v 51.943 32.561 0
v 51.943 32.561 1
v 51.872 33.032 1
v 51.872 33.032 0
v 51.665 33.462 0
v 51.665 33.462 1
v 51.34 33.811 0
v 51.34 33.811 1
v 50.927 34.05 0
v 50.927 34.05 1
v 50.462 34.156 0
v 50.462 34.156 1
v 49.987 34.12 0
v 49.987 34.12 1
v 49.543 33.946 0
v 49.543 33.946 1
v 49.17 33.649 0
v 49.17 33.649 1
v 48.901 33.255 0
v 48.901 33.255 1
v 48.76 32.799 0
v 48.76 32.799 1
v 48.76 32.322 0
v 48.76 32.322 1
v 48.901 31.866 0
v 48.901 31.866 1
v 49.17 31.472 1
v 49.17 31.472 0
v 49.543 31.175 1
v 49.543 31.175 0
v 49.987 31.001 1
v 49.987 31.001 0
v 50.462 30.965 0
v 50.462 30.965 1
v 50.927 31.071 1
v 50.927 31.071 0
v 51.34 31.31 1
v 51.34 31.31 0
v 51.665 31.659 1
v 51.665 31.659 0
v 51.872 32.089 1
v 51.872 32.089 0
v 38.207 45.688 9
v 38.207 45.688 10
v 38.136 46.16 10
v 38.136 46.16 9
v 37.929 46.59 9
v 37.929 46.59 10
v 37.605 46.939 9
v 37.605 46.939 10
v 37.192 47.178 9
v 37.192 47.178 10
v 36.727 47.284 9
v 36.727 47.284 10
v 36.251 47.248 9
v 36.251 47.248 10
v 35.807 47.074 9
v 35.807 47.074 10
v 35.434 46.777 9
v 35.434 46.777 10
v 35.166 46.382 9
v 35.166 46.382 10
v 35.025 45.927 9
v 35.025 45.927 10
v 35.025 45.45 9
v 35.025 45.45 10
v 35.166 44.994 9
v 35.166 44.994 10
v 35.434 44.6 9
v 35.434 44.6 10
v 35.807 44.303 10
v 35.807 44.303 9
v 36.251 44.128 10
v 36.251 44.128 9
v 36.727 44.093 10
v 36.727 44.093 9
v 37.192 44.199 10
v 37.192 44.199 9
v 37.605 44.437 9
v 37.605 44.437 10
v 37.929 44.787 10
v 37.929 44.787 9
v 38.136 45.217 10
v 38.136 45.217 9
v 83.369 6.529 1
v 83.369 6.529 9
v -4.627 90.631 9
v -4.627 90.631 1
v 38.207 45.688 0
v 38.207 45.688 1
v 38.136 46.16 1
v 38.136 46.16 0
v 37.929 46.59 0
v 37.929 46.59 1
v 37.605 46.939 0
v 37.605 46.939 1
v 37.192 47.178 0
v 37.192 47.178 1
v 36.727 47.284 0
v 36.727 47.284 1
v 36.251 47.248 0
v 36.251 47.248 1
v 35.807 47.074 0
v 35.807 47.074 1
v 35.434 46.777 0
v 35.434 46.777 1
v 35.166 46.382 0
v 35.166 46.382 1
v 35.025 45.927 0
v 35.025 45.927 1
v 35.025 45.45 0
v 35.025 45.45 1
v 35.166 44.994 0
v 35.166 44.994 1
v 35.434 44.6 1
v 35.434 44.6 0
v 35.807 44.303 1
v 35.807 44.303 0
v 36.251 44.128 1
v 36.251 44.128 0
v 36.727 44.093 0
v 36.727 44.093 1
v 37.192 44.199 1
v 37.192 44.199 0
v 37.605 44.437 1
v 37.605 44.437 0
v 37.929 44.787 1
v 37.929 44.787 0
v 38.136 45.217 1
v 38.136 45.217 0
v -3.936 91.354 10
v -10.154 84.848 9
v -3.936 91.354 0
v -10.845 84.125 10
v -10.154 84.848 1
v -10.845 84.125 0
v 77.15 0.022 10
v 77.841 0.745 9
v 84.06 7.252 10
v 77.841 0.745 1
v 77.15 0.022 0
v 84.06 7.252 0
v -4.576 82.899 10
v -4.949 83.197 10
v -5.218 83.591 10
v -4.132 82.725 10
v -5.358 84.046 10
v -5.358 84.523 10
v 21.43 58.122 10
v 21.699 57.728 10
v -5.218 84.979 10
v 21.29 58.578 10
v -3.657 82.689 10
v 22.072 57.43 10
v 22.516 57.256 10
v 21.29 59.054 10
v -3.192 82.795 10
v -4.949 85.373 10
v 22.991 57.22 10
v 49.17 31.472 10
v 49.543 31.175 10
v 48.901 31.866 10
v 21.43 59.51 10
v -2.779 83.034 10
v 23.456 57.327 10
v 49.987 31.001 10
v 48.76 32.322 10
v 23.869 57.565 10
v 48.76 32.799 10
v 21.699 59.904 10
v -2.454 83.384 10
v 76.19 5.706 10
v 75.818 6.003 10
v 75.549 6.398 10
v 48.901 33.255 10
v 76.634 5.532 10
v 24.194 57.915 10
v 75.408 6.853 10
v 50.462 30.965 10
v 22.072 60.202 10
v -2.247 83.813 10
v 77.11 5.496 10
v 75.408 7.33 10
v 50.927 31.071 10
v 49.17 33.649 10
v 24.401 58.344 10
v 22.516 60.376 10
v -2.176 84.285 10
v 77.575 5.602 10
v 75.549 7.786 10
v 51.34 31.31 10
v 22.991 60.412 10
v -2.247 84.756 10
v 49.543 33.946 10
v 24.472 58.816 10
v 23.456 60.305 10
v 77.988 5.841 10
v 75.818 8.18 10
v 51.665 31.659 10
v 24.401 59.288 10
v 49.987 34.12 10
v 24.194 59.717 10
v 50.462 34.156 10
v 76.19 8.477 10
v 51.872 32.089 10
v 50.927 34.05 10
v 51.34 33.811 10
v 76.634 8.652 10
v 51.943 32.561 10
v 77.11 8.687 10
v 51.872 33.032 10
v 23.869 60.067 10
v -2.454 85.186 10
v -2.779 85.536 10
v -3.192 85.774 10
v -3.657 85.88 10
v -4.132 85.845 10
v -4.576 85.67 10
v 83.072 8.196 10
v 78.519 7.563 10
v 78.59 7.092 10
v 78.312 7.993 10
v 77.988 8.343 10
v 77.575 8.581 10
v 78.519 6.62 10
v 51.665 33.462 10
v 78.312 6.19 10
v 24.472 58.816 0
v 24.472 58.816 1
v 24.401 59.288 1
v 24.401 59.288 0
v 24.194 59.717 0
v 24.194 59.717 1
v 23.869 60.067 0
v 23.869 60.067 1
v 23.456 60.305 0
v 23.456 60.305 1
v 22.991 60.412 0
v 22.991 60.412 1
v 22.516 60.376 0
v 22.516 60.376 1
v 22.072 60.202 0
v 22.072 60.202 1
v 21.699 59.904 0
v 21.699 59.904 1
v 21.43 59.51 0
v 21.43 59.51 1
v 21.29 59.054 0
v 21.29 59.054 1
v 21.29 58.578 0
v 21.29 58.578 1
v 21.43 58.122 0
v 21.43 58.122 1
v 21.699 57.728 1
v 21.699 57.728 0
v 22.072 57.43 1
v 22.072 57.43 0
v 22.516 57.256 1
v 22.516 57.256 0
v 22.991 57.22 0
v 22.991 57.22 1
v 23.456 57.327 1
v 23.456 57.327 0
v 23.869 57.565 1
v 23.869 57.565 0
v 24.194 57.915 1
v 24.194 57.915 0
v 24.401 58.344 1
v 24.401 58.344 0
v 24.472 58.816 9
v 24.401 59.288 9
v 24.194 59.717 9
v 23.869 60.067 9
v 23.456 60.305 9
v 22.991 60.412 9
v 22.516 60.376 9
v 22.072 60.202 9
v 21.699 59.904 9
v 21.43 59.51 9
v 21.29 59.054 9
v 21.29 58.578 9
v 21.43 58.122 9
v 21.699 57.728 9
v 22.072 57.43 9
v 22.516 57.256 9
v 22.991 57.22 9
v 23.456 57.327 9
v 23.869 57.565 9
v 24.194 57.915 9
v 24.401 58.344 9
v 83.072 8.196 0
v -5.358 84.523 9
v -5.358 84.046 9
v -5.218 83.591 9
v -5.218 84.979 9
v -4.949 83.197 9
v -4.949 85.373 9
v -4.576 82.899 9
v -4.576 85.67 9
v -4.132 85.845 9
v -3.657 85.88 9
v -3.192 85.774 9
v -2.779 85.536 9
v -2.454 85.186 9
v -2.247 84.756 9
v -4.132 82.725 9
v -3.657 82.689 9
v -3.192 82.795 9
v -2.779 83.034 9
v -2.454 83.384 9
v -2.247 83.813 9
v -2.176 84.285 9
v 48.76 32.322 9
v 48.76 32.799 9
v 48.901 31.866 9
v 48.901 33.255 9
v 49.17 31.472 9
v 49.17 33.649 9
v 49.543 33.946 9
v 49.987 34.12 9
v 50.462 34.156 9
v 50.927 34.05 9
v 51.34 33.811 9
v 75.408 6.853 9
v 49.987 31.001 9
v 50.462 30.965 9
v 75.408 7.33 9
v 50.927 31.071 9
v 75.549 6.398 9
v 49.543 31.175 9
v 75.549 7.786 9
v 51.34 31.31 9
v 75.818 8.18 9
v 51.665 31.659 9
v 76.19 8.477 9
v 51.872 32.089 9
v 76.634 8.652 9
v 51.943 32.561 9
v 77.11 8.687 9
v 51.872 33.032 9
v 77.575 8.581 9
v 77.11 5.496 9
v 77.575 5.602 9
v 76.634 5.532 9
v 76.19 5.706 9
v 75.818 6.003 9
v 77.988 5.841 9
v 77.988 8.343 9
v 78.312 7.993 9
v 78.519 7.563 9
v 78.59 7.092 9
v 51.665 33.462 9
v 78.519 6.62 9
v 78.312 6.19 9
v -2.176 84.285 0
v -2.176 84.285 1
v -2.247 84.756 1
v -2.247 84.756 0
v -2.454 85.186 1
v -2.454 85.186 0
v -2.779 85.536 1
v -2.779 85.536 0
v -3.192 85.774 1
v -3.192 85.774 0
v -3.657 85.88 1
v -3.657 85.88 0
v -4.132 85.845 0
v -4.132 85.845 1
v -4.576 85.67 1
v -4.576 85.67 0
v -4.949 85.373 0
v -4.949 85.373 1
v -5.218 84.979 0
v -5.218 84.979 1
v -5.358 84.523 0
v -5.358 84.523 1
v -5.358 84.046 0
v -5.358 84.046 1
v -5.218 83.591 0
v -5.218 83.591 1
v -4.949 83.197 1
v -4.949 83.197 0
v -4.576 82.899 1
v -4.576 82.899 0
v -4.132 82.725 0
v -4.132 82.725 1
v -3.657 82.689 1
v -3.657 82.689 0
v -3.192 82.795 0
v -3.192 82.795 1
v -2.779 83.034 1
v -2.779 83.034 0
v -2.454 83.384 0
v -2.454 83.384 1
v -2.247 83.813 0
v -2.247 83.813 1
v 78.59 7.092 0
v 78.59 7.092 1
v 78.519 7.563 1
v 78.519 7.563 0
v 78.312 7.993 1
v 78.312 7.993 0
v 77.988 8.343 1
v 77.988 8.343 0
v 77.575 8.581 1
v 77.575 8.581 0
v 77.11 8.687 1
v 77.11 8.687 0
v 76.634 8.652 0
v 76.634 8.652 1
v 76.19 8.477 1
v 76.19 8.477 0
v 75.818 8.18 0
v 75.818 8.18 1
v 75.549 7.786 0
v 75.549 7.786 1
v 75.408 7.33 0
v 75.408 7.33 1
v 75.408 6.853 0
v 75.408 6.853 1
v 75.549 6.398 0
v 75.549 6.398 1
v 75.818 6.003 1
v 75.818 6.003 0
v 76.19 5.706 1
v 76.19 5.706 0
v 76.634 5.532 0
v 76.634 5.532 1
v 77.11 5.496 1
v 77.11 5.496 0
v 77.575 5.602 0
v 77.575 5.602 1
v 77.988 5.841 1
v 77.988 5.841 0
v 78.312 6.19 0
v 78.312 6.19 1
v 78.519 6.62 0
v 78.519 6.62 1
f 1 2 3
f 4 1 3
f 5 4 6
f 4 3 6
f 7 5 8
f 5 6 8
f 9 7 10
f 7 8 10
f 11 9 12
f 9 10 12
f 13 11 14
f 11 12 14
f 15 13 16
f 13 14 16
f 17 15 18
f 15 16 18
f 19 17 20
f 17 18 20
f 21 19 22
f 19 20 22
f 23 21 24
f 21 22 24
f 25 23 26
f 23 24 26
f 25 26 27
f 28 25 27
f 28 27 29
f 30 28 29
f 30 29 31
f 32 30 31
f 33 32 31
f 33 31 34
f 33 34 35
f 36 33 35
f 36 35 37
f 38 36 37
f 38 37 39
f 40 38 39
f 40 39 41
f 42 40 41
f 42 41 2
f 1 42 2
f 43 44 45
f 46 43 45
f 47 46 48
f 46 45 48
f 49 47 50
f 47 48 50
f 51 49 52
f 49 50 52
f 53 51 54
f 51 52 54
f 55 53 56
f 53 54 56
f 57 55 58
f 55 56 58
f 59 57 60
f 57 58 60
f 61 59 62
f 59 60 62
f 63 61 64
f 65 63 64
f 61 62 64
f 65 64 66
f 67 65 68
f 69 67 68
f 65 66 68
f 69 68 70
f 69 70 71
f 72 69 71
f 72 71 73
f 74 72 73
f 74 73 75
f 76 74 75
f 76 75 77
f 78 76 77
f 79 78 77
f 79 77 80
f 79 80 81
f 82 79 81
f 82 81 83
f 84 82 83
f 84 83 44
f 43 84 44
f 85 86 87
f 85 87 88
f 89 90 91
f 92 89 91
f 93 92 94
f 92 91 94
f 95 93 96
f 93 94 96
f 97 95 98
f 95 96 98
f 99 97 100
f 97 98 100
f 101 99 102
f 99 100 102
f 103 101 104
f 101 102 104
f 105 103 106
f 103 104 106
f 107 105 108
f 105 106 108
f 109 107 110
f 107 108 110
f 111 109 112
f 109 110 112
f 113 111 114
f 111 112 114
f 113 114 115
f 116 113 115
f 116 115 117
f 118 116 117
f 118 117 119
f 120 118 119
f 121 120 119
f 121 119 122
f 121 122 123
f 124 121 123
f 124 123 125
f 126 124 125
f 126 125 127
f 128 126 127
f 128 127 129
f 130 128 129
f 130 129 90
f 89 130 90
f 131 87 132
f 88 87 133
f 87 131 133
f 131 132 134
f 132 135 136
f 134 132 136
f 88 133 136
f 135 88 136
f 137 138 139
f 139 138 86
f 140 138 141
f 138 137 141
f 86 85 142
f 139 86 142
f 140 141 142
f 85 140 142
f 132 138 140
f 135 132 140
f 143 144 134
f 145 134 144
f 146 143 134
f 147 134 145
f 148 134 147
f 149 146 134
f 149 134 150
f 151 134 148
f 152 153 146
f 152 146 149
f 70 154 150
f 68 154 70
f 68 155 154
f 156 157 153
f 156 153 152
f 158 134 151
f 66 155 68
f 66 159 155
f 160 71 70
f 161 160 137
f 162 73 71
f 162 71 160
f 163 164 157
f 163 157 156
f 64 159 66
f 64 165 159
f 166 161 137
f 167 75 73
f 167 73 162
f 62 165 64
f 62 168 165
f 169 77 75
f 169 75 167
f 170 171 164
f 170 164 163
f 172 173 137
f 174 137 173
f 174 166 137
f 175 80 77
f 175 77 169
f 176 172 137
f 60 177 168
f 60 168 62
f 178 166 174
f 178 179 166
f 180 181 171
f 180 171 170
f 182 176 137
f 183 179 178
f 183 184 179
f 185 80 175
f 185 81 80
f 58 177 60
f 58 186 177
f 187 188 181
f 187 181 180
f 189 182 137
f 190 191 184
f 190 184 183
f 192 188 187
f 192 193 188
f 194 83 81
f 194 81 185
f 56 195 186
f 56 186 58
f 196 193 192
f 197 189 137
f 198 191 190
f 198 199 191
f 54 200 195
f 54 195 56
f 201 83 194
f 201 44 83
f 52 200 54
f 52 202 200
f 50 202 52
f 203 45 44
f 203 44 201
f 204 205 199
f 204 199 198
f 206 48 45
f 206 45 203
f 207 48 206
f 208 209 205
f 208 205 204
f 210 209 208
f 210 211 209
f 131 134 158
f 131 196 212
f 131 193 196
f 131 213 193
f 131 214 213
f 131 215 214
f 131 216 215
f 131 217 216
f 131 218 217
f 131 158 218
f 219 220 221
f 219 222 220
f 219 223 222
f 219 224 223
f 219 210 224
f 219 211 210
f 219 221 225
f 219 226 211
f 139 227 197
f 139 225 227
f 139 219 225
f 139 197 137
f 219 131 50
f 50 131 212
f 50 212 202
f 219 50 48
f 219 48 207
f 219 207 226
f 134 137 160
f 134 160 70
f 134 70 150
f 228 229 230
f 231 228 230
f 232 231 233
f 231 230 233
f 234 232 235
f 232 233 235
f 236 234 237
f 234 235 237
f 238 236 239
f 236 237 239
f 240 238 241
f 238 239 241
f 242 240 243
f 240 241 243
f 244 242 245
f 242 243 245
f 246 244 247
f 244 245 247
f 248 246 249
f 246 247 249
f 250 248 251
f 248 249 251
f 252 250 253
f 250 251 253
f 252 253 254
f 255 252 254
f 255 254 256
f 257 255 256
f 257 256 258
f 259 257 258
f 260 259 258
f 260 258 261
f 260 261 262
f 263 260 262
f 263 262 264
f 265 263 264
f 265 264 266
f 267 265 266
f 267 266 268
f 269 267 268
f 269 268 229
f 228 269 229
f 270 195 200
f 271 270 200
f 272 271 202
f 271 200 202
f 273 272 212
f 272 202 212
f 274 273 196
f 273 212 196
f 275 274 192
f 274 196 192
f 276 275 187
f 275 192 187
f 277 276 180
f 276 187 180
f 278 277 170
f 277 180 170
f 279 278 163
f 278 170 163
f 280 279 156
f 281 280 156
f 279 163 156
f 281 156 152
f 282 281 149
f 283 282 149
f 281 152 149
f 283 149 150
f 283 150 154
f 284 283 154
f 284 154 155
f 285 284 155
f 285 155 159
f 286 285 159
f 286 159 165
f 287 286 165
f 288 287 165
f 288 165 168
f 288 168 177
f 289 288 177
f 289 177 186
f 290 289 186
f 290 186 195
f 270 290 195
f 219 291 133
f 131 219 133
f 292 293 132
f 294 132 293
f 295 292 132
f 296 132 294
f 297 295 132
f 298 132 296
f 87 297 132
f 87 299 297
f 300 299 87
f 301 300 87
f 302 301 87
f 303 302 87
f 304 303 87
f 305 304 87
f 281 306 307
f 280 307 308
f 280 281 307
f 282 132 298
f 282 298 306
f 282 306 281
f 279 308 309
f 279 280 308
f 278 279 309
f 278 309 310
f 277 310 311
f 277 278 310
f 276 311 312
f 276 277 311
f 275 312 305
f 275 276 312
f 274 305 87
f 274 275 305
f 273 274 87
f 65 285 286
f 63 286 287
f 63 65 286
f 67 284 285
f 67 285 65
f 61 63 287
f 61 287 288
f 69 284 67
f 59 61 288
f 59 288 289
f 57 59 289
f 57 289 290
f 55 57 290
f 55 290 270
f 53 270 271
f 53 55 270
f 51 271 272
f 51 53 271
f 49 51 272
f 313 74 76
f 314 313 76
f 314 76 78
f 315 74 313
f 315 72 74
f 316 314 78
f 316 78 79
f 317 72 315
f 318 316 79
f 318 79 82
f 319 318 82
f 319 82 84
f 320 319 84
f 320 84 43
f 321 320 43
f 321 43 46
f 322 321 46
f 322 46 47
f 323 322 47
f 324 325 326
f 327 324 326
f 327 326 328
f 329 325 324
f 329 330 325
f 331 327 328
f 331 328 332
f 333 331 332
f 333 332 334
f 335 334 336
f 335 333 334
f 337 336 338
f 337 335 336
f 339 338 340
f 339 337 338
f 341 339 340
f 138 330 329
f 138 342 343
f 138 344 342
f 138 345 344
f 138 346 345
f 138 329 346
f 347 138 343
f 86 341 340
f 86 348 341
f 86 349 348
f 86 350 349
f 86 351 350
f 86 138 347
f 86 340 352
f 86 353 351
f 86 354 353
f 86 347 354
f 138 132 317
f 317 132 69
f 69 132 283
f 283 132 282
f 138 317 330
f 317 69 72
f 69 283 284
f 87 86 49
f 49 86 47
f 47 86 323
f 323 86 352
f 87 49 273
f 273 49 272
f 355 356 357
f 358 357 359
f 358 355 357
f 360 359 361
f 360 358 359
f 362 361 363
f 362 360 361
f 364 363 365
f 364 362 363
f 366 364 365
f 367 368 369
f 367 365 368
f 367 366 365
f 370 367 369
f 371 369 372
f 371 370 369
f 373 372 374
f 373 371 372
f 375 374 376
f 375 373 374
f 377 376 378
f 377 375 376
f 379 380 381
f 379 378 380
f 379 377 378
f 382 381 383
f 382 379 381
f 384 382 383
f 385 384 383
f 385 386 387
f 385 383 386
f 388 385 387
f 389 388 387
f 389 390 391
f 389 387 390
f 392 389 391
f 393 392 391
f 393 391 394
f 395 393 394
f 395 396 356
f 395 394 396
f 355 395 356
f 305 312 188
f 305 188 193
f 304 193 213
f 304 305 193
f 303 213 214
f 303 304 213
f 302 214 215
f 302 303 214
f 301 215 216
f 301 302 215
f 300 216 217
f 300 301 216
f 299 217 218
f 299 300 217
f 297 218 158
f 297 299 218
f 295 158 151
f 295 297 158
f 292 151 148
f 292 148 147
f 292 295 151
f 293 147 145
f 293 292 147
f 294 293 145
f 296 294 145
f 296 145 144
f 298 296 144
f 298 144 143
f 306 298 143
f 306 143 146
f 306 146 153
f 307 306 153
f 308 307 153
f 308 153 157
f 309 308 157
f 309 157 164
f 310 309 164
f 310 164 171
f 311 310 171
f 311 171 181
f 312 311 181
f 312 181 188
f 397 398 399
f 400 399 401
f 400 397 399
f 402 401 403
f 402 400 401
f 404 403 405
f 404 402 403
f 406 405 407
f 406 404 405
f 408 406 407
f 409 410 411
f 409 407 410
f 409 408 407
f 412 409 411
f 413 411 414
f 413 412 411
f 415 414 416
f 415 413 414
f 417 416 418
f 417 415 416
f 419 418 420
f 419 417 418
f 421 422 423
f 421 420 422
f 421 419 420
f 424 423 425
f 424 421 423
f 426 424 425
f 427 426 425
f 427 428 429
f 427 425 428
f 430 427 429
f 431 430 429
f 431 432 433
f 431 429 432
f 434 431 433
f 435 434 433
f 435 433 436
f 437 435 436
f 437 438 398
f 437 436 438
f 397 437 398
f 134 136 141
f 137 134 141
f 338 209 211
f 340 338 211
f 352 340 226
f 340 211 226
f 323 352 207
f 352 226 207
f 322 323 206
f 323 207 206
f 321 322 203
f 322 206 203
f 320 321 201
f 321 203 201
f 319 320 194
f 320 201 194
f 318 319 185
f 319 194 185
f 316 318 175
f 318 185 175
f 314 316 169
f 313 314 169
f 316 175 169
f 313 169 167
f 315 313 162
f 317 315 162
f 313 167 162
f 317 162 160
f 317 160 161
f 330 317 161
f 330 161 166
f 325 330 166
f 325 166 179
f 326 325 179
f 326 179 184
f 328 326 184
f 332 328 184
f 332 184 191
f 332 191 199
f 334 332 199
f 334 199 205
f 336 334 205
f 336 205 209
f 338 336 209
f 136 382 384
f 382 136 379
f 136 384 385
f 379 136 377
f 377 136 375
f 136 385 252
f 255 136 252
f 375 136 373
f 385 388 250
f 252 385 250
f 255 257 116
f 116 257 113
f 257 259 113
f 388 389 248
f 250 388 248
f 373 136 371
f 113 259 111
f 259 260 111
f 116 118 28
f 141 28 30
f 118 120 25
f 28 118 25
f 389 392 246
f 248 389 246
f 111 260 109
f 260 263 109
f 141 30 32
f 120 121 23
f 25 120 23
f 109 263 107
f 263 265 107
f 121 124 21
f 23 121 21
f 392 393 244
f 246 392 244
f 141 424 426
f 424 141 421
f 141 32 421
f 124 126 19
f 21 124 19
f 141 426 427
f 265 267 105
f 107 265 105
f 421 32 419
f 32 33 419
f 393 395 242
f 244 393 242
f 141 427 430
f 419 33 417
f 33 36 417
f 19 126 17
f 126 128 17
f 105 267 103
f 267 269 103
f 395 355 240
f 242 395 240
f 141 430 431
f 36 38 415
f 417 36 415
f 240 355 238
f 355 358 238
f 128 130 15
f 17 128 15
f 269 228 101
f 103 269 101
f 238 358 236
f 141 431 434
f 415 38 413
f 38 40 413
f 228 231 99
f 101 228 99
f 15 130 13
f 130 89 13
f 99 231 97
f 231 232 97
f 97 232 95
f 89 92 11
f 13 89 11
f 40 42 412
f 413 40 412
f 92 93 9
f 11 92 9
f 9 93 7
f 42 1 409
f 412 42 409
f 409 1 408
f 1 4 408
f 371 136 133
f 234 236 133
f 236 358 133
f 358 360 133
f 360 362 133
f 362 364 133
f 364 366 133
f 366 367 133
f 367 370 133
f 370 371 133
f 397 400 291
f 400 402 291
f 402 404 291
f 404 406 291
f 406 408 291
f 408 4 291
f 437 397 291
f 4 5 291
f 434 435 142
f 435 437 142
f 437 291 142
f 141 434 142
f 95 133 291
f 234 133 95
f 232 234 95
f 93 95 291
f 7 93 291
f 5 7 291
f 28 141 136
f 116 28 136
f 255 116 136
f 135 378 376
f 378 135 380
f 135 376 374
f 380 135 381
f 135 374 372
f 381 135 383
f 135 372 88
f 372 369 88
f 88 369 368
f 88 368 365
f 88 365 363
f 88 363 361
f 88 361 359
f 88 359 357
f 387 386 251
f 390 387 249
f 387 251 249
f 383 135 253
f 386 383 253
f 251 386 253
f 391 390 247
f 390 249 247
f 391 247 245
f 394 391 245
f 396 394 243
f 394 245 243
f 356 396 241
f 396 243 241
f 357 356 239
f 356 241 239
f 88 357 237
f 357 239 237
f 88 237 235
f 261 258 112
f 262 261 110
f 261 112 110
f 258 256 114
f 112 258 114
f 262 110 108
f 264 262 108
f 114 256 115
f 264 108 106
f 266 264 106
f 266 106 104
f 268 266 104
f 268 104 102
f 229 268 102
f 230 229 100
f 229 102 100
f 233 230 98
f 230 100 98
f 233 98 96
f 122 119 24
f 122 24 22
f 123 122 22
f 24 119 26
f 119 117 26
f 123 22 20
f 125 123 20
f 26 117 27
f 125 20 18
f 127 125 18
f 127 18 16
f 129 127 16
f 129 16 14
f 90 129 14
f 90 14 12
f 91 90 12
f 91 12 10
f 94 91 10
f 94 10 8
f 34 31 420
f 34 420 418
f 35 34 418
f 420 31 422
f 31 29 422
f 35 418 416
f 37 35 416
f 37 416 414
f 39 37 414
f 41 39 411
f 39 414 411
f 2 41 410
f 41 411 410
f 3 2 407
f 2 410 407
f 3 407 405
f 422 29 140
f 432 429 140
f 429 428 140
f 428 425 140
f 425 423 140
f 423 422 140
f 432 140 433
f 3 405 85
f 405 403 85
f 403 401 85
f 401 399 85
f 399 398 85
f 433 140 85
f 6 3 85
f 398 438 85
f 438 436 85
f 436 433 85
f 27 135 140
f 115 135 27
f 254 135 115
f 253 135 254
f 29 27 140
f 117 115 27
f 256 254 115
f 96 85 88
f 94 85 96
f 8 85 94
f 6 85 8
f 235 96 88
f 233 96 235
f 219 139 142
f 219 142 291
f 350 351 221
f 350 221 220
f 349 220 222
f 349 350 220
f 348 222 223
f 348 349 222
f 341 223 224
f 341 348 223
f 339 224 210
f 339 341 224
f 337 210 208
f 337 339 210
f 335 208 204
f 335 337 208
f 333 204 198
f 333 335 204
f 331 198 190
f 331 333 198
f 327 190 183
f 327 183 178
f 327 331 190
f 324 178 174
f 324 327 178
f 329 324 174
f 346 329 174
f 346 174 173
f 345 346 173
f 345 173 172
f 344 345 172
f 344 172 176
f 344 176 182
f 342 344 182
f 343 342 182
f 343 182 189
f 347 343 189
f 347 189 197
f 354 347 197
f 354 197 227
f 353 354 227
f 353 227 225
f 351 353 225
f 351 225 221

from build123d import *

# Parameters (mm, degrees)
SKETCH_2_R          = 1.6
EXTRUDE_1_DEPTH     = 10
SKETCH_3_W          = 8
SKETCH_3_H          = 8
CUT_EXTRUDE_1_DEPTH = 140.947387002
SKETCH_4_R          = 1.6
CUT_EXTRUDE_2_DEPTH = 10


with BuildPart() as part:
    # ｽｹｯﾁ2 → ﾎﾞｽ - 押し出し1 (new body)
    with BuildSketch(Plane.XY):
        Polygon((83.071643169, 8.195972832), (-3.936021884, 91.354077293), (-10.845357286, 84.124894469), (77.150331852, 0.022479987), (84.059667254, 7.25166281), align=None)
        with Locations((-3.776098173, 84.28481818)):
            Circle(SKETCH_2_R, mode=Mode.SUBTRACT)
        with Locations((76.990408141, 7.0917391)):
            Circle(SKETCH_2_R, mode=Mode.SUBTRACT)
    extrude(amount=EXTRUDE_1_DEPTH)

    # ｽｹｯﾁ3 → ｶｯﾄ - 押し出し1 (cut, through all)
    with BuildSketch(Plane(origin=(40.308371471, -38.524970914, 0), x_dir=(0, 0, -1), z_dir=(0.7229182823698357, -0.690933540230496, 0))):
        with Locations((-5, 58.32200311)):
            Rectangle(SKETCH_3_W, SKETCH_3_H)
    extrude(amount=-CUT_EXTRUDE_1_DEPTH, mode=Mode.SUBTRACT)

    # ｽｹｯﾁ4 → ｶｯﾄ - 押し出し2 (cut)
    with BuildSketch(Plane.XY.offset(10)):
        with Locations((50.342602349, 32.560541375)):
            Circle(SKETCH_4_R)
        with Locations((22.871707619, 58.816015904)):
            Circle(SKETCH_4_R)
        with Locations((36.607154984, 45.68827864)):
            Circle(SKETCH_4_R)
    extrude(amount=-CUT_EXTRUDE_2_DEPTH, mode=Mode.SUBTRACT)


solid = part.part
